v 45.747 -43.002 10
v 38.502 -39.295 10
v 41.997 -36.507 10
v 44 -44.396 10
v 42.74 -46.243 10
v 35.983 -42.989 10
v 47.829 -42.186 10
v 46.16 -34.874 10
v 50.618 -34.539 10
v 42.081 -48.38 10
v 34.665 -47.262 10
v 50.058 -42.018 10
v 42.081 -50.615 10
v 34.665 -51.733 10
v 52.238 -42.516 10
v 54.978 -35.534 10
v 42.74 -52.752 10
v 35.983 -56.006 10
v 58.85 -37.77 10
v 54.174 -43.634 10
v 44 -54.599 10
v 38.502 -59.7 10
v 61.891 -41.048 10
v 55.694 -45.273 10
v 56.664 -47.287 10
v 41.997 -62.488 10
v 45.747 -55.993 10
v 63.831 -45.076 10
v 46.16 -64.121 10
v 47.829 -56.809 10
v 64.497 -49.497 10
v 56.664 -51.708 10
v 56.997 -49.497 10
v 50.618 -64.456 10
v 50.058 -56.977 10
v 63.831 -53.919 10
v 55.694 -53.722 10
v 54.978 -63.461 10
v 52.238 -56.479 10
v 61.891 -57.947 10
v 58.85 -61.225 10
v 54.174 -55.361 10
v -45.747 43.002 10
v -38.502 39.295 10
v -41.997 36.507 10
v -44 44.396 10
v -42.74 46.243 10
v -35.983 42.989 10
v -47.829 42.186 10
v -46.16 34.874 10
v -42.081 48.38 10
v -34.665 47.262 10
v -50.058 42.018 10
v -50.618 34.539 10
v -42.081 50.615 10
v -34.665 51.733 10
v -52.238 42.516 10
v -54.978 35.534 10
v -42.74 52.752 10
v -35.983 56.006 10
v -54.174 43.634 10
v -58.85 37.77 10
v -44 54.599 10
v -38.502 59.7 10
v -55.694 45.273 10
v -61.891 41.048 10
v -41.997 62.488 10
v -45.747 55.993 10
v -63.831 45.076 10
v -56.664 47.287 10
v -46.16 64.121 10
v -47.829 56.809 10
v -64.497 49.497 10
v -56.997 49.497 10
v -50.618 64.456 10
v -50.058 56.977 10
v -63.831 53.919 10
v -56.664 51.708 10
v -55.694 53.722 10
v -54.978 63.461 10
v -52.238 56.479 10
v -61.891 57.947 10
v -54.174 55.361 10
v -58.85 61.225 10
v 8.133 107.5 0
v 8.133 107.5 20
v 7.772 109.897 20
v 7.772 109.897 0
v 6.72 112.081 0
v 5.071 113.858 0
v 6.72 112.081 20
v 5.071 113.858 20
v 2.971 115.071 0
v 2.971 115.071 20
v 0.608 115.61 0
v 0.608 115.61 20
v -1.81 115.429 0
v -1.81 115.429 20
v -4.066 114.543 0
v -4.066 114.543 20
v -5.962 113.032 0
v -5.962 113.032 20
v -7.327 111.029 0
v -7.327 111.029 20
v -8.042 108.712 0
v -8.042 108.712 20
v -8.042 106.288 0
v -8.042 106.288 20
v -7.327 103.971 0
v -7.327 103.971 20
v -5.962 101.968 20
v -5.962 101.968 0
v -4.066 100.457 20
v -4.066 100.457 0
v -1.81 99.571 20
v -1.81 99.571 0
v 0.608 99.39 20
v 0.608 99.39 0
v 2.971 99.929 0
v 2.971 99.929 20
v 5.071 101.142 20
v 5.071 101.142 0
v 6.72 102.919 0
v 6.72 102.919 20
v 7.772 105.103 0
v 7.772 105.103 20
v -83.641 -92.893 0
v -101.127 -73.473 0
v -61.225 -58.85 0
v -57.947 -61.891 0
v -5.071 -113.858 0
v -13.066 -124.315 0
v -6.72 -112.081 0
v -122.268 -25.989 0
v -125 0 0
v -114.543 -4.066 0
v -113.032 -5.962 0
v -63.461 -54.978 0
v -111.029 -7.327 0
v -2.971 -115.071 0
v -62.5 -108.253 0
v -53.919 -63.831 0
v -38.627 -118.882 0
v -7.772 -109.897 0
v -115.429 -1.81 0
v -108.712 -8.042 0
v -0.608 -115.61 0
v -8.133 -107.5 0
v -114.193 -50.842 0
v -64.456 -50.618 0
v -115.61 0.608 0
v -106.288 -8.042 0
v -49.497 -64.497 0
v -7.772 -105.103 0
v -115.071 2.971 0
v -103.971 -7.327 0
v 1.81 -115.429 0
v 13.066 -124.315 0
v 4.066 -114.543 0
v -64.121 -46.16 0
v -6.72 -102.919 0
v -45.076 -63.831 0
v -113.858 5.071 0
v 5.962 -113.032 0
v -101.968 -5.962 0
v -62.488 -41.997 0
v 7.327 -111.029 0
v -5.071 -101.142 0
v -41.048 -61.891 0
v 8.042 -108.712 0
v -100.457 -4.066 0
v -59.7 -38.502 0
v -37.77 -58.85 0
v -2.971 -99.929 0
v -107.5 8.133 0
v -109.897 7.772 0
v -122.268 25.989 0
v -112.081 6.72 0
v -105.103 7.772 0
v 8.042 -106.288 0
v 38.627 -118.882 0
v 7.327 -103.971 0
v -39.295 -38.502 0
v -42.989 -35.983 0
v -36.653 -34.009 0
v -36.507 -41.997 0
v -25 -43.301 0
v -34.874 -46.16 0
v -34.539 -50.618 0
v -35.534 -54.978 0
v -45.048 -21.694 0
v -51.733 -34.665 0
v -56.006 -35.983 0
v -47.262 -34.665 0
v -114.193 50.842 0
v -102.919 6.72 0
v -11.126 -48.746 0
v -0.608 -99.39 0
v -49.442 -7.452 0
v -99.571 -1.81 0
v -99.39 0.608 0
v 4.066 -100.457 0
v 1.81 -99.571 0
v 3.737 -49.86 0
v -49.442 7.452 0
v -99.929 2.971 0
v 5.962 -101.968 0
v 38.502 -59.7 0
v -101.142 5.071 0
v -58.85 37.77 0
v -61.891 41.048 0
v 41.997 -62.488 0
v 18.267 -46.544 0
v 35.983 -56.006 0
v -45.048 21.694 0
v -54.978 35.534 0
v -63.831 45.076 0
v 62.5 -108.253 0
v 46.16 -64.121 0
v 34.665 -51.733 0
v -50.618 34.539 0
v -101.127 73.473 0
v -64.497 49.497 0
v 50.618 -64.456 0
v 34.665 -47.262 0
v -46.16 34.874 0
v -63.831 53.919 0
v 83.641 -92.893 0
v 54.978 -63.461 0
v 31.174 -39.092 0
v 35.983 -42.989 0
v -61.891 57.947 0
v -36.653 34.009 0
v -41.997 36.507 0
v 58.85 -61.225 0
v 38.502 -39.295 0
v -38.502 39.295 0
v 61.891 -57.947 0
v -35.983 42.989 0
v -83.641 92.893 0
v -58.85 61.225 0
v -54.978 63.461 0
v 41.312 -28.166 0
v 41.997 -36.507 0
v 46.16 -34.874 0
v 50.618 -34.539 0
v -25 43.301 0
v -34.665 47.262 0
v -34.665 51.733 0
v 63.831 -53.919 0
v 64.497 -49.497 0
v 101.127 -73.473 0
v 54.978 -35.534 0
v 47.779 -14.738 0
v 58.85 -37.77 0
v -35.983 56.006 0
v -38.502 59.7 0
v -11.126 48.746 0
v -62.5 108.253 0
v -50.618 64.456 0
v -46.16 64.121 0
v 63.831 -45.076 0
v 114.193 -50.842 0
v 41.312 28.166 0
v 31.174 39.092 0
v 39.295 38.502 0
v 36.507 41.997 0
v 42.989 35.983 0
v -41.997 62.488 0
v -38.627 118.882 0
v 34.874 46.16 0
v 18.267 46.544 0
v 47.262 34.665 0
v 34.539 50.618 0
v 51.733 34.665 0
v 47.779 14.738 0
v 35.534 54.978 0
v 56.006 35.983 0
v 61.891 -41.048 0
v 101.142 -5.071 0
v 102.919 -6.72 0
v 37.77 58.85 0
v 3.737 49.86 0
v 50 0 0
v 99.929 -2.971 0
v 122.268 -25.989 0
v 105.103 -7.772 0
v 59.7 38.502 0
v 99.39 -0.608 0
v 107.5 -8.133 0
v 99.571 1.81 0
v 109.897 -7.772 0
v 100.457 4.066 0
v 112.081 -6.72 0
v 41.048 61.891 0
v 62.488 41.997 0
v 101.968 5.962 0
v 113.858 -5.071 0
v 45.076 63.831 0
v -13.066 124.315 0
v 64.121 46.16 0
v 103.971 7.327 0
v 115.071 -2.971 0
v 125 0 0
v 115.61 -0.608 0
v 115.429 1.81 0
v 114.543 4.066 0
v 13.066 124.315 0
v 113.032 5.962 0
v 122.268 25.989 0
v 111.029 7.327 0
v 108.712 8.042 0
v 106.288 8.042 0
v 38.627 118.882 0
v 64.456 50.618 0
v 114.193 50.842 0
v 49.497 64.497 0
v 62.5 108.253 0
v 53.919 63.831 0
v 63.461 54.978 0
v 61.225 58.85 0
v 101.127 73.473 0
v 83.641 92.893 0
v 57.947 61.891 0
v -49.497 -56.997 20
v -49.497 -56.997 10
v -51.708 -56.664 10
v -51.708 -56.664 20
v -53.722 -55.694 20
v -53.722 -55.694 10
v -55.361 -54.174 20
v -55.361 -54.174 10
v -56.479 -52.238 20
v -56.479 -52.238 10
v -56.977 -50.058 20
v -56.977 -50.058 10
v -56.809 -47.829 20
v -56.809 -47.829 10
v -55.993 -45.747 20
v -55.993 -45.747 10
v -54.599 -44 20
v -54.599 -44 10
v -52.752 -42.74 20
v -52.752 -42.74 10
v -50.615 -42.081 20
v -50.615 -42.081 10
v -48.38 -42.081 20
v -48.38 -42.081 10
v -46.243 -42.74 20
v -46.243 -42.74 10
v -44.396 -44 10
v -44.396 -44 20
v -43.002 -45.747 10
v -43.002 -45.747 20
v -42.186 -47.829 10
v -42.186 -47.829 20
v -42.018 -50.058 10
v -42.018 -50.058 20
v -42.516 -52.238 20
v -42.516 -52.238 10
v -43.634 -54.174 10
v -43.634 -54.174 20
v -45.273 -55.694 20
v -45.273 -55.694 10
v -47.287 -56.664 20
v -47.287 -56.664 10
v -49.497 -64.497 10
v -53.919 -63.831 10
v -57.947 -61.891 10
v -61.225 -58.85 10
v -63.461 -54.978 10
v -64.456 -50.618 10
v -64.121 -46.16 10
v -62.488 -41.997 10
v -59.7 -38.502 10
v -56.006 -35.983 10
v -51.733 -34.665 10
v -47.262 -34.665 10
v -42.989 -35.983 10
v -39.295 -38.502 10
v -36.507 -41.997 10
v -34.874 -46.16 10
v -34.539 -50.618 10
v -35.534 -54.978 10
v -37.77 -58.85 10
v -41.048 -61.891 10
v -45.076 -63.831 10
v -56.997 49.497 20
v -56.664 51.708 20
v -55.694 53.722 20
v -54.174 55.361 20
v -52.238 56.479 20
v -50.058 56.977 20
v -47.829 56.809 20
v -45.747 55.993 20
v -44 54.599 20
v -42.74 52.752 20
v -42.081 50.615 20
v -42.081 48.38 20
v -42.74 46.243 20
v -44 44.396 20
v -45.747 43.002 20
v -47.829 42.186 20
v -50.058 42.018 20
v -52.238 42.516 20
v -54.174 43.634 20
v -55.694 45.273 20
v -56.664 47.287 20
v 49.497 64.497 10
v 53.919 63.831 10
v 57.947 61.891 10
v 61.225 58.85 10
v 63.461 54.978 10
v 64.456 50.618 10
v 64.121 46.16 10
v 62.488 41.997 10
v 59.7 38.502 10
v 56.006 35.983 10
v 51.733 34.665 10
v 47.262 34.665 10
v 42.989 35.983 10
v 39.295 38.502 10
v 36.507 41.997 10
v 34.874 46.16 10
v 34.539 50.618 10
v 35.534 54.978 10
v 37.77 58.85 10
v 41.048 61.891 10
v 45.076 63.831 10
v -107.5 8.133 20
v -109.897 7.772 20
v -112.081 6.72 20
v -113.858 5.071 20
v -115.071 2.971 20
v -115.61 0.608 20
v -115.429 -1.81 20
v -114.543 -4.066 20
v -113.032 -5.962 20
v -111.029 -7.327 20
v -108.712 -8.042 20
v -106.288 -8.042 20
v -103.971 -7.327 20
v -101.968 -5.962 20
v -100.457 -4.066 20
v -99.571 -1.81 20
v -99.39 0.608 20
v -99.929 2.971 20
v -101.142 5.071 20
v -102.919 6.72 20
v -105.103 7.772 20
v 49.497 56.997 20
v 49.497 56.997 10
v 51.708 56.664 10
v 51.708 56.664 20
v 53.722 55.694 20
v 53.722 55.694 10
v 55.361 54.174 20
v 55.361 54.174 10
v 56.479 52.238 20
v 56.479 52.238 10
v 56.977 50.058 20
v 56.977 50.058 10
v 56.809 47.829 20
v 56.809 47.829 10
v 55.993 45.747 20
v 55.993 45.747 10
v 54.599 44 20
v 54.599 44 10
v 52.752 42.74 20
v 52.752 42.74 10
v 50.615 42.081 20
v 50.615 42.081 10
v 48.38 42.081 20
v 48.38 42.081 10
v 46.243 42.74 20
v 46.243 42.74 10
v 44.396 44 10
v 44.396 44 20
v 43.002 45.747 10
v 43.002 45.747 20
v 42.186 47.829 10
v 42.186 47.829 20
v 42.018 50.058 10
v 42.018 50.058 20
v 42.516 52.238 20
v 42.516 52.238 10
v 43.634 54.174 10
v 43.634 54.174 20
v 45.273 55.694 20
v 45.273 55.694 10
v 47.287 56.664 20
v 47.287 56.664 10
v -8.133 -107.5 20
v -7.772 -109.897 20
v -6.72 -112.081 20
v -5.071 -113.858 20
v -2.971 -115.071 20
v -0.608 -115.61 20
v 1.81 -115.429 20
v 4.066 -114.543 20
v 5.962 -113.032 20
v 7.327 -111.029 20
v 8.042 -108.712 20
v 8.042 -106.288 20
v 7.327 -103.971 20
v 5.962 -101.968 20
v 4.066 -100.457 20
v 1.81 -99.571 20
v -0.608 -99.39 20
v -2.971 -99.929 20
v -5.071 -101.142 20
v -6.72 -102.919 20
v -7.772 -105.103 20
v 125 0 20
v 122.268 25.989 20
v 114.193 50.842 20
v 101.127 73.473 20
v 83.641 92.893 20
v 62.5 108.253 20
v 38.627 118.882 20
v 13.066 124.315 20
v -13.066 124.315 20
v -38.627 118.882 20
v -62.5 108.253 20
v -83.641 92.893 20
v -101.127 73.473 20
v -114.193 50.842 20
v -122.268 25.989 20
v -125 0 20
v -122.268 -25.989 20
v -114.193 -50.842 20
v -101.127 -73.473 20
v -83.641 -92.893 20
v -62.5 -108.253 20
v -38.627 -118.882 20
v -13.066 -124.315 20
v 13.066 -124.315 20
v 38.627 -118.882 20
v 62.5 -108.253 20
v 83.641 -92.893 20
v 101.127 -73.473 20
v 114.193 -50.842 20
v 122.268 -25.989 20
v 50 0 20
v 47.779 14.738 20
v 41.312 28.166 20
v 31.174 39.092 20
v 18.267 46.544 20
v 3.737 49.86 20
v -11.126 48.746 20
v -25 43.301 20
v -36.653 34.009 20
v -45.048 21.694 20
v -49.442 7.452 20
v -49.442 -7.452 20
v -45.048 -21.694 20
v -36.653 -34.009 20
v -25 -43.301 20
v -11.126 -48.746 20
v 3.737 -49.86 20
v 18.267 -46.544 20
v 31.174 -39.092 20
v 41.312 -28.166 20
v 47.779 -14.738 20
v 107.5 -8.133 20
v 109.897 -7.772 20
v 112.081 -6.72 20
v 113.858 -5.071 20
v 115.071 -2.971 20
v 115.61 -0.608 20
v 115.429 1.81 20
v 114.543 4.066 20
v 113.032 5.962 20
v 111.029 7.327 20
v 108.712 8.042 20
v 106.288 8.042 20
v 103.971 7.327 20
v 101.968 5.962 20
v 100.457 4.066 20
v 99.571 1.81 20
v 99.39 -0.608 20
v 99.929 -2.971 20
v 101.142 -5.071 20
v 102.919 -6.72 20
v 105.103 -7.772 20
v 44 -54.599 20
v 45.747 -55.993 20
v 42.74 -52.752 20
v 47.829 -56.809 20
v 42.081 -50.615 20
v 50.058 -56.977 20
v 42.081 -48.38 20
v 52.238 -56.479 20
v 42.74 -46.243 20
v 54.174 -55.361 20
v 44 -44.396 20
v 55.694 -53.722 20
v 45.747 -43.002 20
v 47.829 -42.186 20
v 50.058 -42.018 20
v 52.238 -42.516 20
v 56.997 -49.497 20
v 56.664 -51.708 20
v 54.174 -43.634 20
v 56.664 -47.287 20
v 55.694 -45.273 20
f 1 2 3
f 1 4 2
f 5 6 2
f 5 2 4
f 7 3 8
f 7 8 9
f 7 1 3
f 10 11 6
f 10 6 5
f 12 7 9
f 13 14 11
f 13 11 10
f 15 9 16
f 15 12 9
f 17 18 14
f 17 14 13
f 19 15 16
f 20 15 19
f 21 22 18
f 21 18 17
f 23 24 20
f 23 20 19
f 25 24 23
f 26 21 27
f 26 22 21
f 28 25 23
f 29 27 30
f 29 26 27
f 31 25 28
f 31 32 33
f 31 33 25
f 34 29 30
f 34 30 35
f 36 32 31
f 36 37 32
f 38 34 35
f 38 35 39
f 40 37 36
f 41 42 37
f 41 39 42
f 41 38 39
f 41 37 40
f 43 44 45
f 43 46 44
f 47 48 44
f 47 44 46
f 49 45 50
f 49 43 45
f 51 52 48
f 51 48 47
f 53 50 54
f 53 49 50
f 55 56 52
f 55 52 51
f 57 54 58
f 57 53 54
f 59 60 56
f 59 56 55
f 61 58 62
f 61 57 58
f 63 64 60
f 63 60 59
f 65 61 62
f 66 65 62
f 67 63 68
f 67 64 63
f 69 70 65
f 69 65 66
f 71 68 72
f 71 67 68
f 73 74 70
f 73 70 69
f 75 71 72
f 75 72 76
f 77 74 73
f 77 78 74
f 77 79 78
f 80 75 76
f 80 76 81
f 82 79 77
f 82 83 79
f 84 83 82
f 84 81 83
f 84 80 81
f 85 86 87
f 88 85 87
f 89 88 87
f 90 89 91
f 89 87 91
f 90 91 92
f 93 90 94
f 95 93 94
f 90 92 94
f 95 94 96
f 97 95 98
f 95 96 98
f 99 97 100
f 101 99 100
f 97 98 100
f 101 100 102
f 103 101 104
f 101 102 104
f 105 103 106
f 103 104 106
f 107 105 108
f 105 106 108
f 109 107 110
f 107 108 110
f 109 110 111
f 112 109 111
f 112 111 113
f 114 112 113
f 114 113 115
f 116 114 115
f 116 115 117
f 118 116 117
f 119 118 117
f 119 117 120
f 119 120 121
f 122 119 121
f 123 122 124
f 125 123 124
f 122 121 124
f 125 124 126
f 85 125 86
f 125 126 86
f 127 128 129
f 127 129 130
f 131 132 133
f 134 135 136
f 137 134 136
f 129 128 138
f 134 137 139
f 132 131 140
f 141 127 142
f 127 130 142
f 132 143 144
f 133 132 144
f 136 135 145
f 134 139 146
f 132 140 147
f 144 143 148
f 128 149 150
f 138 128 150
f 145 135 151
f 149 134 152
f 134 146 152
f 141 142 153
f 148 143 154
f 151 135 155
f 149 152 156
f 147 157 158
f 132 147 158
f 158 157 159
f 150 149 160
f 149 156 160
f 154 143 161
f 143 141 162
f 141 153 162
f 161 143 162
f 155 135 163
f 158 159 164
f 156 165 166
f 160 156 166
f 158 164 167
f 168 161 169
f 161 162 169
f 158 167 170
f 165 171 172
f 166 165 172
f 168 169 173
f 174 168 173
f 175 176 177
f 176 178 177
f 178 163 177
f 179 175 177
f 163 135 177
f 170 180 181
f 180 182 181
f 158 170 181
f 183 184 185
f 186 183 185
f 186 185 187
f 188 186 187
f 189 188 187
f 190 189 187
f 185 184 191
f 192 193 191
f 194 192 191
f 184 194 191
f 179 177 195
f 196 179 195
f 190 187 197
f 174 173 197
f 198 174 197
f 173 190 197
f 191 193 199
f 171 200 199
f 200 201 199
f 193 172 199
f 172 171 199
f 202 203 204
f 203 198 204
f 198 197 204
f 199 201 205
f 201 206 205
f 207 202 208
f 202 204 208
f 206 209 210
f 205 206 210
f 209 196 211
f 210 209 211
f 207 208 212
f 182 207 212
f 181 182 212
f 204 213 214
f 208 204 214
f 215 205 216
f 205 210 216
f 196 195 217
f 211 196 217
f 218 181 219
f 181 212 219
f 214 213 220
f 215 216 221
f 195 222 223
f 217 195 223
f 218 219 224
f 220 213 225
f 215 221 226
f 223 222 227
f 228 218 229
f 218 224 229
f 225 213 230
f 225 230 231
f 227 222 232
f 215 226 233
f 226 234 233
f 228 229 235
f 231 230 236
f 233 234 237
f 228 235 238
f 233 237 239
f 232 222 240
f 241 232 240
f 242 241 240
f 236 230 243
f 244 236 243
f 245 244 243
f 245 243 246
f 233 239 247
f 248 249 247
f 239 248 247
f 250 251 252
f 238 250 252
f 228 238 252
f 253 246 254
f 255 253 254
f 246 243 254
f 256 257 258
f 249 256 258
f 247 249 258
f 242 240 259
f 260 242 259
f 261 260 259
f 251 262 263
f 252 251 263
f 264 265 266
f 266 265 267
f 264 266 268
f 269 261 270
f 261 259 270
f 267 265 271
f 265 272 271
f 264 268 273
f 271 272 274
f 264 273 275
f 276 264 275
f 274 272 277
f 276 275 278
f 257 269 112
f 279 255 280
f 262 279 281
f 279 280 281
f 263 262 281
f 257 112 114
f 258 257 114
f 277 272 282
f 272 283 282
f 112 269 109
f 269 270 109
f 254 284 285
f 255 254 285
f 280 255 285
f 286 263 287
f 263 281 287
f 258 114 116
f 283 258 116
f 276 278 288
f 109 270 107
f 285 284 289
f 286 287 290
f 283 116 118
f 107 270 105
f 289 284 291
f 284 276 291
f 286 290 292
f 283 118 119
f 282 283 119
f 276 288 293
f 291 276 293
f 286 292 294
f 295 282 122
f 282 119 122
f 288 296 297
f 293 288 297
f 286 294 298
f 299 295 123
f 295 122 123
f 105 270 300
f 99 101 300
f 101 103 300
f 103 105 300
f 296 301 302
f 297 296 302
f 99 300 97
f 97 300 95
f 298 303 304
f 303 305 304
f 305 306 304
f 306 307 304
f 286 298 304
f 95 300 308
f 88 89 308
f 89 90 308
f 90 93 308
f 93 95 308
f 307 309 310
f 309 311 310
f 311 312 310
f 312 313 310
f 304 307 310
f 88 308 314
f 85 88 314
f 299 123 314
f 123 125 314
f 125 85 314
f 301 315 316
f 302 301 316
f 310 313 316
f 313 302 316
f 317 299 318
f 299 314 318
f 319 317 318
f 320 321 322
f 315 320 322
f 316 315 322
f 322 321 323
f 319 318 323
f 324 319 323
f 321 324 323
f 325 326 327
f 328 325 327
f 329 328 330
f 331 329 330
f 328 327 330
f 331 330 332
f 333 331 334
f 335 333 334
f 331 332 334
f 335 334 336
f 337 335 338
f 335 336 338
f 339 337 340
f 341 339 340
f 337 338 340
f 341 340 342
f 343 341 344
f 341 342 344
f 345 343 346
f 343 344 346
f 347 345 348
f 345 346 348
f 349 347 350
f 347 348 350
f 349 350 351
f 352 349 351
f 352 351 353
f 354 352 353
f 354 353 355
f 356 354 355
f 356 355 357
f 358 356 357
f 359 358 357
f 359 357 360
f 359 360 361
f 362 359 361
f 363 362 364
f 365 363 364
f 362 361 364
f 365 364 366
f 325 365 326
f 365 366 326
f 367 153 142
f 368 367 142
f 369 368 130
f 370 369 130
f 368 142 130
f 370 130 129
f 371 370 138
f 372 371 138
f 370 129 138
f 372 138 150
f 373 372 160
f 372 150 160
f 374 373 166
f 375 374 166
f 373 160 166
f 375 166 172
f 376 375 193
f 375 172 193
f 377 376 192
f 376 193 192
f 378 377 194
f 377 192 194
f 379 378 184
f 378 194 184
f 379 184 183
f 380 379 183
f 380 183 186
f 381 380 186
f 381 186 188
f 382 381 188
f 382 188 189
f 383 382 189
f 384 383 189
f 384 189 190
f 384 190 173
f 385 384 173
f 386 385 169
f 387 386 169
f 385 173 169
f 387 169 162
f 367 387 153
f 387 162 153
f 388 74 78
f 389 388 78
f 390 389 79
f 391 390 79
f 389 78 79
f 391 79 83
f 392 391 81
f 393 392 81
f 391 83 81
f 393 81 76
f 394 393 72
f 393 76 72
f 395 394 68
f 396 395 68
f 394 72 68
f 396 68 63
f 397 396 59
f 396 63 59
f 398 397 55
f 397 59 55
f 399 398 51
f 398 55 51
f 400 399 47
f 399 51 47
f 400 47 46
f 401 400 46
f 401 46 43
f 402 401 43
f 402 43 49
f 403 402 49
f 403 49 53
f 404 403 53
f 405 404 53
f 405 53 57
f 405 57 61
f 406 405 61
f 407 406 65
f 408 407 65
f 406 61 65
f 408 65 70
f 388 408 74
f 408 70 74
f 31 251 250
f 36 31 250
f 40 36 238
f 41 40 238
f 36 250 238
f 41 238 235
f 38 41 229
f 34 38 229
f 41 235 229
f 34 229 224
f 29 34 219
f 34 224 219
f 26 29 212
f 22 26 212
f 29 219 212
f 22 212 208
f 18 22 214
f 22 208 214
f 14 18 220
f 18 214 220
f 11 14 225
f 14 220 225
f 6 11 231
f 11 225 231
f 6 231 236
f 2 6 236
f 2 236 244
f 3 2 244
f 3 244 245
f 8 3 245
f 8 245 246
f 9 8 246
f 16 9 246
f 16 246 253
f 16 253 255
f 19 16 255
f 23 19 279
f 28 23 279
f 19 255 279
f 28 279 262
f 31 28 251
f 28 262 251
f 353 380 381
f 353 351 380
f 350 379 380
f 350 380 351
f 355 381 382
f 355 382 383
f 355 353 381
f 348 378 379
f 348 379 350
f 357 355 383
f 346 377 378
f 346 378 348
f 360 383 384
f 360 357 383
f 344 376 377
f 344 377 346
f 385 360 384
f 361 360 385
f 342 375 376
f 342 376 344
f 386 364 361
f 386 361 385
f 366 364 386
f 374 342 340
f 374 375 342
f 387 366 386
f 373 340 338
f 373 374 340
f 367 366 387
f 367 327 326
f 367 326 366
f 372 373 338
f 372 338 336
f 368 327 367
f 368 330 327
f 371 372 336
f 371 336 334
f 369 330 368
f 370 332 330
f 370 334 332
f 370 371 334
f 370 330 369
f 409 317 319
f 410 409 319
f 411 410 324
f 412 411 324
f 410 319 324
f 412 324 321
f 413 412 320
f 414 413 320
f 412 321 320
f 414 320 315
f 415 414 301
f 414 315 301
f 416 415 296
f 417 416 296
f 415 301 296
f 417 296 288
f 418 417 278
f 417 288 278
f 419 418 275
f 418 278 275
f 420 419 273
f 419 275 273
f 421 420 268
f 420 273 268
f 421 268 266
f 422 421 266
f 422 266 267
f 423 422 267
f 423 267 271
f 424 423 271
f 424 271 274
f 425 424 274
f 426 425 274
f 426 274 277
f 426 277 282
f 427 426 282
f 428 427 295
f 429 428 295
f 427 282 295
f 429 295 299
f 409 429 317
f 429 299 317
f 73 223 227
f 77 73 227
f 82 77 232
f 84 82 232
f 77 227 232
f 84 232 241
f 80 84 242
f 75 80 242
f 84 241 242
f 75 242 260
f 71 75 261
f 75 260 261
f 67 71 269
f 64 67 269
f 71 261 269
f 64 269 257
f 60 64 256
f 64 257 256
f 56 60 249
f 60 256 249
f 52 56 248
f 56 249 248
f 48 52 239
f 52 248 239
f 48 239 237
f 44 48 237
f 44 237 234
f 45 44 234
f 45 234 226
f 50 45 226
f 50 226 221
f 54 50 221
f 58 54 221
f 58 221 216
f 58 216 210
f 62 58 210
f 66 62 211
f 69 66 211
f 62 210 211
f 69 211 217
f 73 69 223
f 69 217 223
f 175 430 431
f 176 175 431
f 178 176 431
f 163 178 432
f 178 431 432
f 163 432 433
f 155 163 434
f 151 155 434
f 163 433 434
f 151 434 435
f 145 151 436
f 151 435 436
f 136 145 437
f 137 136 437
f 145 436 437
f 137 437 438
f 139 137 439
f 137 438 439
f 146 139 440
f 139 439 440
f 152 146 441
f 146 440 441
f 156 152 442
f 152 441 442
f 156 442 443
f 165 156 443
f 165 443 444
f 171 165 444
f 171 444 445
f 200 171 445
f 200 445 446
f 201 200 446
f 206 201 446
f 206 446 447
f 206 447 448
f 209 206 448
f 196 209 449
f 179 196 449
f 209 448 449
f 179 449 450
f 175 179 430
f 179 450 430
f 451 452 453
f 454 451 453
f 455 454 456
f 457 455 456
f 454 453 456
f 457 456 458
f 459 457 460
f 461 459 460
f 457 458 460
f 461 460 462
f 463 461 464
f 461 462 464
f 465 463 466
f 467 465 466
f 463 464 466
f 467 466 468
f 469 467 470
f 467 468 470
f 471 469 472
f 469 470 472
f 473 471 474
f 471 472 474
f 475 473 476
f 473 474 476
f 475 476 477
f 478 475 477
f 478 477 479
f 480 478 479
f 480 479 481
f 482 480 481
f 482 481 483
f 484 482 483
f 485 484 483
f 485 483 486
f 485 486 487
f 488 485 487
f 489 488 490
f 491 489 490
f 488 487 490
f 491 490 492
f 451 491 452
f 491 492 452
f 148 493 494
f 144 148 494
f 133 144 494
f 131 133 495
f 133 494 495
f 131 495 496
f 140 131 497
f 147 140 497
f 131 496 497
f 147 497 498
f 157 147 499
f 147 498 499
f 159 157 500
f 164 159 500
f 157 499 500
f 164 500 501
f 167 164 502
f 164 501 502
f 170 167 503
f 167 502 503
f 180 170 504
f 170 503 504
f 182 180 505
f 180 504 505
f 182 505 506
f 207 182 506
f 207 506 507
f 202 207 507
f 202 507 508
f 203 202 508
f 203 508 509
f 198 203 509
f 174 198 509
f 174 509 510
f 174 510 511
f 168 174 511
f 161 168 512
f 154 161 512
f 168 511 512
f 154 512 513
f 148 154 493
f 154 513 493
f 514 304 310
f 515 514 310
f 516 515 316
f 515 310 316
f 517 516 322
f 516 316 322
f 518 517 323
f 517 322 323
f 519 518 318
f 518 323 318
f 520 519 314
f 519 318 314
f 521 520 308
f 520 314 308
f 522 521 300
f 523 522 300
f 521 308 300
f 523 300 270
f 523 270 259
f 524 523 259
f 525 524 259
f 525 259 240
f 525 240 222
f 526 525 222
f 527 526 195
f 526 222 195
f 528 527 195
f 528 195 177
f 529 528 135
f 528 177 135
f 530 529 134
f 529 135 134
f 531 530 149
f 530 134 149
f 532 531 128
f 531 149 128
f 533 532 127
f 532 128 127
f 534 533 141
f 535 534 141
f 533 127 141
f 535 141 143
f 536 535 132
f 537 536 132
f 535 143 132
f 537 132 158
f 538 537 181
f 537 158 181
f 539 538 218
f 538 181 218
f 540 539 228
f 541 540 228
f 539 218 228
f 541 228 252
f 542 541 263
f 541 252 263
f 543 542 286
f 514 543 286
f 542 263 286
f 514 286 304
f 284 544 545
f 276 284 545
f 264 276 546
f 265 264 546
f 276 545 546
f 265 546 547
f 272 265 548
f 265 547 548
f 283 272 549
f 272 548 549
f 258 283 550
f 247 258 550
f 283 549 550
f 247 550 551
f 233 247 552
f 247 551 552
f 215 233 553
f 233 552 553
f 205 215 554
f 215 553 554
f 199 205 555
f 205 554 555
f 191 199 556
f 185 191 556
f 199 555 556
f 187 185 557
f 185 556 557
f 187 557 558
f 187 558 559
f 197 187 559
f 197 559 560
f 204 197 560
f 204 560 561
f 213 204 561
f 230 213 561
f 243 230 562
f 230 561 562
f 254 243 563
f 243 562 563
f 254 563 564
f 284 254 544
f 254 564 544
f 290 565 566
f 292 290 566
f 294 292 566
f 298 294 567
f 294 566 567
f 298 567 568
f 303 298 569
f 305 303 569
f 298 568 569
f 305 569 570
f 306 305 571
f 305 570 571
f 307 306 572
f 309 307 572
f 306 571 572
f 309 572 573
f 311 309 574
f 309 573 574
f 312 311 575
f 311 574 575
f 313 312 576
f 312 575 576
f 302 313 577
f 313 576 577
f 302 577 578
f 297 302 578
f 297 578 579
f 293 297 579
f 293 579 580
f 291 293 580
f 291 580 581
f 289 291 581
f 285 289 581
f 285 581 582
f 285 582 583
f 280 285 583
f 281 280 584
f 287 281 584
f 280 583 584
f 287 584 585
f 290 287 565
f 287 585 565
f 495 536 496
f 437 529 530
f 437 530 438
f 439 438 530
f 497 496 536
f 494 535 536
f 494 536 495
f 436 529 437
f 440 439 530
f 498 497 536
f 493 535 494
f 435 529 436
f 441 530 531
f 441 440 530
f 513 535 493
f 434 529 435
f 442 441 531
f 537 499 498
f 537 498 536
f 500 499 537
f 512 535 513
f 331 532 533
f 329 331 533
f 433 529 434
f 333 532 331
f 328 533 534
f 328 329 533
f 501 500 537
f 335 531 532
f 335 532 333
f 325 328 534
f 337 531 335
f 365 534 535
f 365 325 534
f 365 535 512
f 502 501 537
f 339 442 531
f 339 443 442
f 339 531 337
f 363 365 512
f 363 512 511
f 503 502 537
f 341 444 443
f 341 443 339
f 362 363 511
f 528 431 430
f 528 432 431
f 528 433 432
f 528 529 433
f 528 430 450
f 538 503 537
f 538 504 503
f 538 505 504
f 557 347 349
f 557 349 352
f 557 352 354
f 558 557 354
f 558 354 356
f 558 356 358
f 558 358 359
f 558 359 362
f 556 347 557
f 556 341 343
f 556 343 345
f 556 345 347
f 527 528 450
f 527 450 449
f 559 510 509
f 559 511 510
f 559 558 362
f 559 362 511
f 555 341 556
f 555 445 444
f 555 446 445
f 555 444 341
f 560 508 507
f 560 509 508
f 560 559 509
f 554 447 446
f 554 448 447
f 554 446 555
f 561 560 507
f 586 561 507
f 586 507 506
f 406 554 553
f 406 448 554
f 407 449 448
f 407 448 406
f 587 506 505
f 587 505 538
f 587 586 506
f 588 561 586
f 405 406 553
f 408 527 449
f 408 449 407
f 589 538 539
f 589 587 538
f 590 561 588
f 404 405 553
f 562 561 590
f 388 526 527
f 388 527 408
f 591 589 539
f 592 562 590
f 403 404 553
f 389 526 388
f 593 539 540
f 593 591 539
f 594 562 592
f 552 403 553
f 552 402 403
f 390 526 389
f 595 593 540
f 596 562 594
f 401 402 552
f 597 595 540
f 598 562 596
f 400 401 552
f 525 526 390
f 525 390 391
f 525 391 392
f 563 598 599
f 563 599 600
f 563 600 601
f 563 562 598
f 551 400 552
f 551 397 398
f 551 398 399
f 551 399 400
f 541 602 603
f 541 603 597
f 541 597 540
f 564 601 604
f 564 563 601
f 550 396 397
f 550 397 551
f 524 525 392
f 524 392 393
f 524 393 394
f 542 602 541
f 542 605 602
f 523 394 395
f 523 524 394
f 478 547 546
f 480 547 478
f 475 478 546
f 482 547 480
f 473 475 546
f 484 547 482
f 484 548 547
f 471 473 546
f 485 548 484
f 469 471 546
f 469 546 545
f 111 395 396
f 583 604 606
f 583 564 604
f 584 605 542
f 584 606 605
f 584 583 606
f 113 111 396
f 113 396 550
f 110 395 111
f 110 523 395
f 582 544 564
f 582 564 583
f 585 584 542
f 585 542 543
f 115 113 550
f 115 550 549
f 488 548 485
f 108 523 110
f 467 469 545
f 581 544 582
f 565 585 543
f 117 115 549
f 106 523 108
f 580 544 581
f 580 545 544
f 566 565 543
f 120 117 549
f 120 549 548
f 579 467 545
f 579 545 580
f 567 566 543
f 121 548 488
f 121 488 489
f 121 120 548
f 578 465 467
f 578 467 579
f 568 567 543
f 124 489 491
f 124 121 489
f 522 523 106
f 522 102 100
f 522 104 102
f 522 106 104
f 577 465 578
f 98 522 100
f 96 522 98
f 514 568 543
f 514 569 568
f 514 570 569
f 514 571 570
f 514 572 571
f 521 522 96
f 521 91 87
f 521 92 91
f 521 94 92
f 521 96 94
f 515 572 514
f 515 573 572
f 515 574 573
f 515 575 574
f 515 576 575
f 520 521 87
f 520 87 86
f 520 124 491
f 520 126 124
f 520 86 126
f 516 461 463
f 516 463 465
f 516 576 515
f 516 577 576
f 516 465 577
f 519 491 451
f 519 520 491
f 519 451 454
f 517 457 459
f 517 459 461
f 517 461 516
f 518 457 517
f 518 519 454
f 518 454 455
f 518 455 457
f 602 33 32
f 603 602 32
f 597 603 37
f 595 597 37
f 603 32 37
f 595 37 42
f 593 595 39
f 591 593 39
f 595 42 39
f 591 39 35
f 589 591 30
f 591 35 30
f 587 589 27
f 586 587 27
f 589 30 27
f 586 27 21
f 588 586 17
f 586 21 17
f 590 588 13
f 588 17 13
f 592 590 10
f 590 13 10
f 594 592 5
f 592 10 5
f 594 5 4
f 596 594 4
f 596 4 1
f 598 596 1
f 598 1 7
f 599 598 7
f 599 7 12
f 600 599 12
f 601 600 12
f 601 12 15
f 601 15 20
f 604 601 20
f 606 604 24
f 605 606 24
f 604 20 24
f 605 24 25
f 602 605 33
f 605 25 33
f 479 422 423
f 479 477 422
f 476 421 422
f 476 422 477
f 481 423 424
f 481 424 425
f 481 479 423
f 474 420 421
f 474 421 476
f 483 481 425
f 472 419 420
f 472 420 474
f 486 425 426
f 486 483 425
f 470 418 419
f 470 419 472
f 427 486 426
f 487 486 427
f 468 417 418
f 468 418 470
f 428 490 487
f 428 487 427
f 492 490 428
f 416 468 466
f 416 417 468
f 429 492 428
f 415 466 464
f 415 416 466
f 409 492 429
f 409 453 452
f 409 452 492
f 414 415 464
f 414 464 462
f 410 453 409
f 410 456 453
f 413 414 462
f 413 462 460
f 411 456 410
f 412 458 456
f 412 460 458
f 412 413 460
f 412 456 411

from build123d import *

# Parameters (mm, degrees)
SKETCH1_R           = 125
BOSS_EXTRUDE1_DEPTH = 20
SKETCH2_R           = 50
CUT_EXTRUDE1_DEPTH  = 20
SKETCH3_R           = 8.132820197
CUT_EXTRUDE2_DEPTH  = 20
SKETCH4_R           = 15
CUT_EXTRUDE3_DEPTH  = 10
SKETCH5_R           = 7.5
CUT_EXTRUDE4_DEPTH  = 10
CIRPATTERN1_COUNT   = 4


with BuildPart() as part:
    # Sketch1 → Boss-Extrude1 (new body)
    with BuildSketch(Plane.XY):
        Circle(SKETCH1_R)
    extrude(amount=BOSS_EXTRUDE1_DEPTH)

    # Sketch2 → Cut-Extrude1 (cut)
    with BuildSketch(Plane.XY.offset(20)):
        Circle(SKETCH2_R)
    extrude(amount=-CUT_EXTRUDE1_DEPTH, mode=Mode.SUBTRACT)

    # Sketch3 → Cut-Extrude2 (cut)
    with BuildSketch(Plane.XY.offset(20)):
        with Locations((0, 107.5)):
            Circle(SKETCH3_R)
    cut_extrude2 = extrude(amount=-CUT_EXTRUDE2_DEPTH, mode=Mode.SUBTRACT)

    # Sketch4 → Cut-Extrude3 (cut)
    with BuildSketch(Plane(origin=(0, 0, 0), x_dir=(-1, 0, 0), z_dir=(0, 0, -1))):
        with Locations((49.497474683, 49.497474683)):
            Circle(SKETCH4_R)
    cut_extrude3 = extrude(amount=-CUT_EXTRUDE3_DEPTH, mode=Mode.SUBTRACT)

    # Sketch5 → Cut-Extrude4 (cut)
    with BuildSketch(Plane(origin=(0, 0, 10), x_dir=(-1, 0, 0), z_dir=(0, 0, -1))):
        with Locations((49.497474683, 49.497474683)):
            Circle(SKETCH5_R)
    cut_extrude4 = extrude(amount=-CUT_EXTRUDE4_DEPTH, mode=Mode.SUBTRACT)

    # CirPattern1: Cut-Extrude2, Cut-Extrude3, Cut-Extrude4 ×4 about axis
    cirpattern1_axis = Axis((0, 0, 0), (0, 0, 1))
    add([cut_extrude2.rotate(cirpattern1_axis, i * 360 / CIRPATTERN1_COUNT) for i in range(1, CIRPATTERN1_COUNT)], mode=Mode.SUBTRACT)
    add([cut_extrude3.rotate(cirpattern1_axis, i * 360 / CIRPATTERN1_COUNT) for i in range(1, CIRPATTERN1_COUNT)], mode=Mode.SUBTRACT)
    add([cut_extrude4.rotate(cirpattern1_axis, i * 360 / CIRPATTERN1_COUNT) for i in range(1, CIRPATTERN1_COUNT)], mode=Mode.SUBTRACT)


solid = part.part
